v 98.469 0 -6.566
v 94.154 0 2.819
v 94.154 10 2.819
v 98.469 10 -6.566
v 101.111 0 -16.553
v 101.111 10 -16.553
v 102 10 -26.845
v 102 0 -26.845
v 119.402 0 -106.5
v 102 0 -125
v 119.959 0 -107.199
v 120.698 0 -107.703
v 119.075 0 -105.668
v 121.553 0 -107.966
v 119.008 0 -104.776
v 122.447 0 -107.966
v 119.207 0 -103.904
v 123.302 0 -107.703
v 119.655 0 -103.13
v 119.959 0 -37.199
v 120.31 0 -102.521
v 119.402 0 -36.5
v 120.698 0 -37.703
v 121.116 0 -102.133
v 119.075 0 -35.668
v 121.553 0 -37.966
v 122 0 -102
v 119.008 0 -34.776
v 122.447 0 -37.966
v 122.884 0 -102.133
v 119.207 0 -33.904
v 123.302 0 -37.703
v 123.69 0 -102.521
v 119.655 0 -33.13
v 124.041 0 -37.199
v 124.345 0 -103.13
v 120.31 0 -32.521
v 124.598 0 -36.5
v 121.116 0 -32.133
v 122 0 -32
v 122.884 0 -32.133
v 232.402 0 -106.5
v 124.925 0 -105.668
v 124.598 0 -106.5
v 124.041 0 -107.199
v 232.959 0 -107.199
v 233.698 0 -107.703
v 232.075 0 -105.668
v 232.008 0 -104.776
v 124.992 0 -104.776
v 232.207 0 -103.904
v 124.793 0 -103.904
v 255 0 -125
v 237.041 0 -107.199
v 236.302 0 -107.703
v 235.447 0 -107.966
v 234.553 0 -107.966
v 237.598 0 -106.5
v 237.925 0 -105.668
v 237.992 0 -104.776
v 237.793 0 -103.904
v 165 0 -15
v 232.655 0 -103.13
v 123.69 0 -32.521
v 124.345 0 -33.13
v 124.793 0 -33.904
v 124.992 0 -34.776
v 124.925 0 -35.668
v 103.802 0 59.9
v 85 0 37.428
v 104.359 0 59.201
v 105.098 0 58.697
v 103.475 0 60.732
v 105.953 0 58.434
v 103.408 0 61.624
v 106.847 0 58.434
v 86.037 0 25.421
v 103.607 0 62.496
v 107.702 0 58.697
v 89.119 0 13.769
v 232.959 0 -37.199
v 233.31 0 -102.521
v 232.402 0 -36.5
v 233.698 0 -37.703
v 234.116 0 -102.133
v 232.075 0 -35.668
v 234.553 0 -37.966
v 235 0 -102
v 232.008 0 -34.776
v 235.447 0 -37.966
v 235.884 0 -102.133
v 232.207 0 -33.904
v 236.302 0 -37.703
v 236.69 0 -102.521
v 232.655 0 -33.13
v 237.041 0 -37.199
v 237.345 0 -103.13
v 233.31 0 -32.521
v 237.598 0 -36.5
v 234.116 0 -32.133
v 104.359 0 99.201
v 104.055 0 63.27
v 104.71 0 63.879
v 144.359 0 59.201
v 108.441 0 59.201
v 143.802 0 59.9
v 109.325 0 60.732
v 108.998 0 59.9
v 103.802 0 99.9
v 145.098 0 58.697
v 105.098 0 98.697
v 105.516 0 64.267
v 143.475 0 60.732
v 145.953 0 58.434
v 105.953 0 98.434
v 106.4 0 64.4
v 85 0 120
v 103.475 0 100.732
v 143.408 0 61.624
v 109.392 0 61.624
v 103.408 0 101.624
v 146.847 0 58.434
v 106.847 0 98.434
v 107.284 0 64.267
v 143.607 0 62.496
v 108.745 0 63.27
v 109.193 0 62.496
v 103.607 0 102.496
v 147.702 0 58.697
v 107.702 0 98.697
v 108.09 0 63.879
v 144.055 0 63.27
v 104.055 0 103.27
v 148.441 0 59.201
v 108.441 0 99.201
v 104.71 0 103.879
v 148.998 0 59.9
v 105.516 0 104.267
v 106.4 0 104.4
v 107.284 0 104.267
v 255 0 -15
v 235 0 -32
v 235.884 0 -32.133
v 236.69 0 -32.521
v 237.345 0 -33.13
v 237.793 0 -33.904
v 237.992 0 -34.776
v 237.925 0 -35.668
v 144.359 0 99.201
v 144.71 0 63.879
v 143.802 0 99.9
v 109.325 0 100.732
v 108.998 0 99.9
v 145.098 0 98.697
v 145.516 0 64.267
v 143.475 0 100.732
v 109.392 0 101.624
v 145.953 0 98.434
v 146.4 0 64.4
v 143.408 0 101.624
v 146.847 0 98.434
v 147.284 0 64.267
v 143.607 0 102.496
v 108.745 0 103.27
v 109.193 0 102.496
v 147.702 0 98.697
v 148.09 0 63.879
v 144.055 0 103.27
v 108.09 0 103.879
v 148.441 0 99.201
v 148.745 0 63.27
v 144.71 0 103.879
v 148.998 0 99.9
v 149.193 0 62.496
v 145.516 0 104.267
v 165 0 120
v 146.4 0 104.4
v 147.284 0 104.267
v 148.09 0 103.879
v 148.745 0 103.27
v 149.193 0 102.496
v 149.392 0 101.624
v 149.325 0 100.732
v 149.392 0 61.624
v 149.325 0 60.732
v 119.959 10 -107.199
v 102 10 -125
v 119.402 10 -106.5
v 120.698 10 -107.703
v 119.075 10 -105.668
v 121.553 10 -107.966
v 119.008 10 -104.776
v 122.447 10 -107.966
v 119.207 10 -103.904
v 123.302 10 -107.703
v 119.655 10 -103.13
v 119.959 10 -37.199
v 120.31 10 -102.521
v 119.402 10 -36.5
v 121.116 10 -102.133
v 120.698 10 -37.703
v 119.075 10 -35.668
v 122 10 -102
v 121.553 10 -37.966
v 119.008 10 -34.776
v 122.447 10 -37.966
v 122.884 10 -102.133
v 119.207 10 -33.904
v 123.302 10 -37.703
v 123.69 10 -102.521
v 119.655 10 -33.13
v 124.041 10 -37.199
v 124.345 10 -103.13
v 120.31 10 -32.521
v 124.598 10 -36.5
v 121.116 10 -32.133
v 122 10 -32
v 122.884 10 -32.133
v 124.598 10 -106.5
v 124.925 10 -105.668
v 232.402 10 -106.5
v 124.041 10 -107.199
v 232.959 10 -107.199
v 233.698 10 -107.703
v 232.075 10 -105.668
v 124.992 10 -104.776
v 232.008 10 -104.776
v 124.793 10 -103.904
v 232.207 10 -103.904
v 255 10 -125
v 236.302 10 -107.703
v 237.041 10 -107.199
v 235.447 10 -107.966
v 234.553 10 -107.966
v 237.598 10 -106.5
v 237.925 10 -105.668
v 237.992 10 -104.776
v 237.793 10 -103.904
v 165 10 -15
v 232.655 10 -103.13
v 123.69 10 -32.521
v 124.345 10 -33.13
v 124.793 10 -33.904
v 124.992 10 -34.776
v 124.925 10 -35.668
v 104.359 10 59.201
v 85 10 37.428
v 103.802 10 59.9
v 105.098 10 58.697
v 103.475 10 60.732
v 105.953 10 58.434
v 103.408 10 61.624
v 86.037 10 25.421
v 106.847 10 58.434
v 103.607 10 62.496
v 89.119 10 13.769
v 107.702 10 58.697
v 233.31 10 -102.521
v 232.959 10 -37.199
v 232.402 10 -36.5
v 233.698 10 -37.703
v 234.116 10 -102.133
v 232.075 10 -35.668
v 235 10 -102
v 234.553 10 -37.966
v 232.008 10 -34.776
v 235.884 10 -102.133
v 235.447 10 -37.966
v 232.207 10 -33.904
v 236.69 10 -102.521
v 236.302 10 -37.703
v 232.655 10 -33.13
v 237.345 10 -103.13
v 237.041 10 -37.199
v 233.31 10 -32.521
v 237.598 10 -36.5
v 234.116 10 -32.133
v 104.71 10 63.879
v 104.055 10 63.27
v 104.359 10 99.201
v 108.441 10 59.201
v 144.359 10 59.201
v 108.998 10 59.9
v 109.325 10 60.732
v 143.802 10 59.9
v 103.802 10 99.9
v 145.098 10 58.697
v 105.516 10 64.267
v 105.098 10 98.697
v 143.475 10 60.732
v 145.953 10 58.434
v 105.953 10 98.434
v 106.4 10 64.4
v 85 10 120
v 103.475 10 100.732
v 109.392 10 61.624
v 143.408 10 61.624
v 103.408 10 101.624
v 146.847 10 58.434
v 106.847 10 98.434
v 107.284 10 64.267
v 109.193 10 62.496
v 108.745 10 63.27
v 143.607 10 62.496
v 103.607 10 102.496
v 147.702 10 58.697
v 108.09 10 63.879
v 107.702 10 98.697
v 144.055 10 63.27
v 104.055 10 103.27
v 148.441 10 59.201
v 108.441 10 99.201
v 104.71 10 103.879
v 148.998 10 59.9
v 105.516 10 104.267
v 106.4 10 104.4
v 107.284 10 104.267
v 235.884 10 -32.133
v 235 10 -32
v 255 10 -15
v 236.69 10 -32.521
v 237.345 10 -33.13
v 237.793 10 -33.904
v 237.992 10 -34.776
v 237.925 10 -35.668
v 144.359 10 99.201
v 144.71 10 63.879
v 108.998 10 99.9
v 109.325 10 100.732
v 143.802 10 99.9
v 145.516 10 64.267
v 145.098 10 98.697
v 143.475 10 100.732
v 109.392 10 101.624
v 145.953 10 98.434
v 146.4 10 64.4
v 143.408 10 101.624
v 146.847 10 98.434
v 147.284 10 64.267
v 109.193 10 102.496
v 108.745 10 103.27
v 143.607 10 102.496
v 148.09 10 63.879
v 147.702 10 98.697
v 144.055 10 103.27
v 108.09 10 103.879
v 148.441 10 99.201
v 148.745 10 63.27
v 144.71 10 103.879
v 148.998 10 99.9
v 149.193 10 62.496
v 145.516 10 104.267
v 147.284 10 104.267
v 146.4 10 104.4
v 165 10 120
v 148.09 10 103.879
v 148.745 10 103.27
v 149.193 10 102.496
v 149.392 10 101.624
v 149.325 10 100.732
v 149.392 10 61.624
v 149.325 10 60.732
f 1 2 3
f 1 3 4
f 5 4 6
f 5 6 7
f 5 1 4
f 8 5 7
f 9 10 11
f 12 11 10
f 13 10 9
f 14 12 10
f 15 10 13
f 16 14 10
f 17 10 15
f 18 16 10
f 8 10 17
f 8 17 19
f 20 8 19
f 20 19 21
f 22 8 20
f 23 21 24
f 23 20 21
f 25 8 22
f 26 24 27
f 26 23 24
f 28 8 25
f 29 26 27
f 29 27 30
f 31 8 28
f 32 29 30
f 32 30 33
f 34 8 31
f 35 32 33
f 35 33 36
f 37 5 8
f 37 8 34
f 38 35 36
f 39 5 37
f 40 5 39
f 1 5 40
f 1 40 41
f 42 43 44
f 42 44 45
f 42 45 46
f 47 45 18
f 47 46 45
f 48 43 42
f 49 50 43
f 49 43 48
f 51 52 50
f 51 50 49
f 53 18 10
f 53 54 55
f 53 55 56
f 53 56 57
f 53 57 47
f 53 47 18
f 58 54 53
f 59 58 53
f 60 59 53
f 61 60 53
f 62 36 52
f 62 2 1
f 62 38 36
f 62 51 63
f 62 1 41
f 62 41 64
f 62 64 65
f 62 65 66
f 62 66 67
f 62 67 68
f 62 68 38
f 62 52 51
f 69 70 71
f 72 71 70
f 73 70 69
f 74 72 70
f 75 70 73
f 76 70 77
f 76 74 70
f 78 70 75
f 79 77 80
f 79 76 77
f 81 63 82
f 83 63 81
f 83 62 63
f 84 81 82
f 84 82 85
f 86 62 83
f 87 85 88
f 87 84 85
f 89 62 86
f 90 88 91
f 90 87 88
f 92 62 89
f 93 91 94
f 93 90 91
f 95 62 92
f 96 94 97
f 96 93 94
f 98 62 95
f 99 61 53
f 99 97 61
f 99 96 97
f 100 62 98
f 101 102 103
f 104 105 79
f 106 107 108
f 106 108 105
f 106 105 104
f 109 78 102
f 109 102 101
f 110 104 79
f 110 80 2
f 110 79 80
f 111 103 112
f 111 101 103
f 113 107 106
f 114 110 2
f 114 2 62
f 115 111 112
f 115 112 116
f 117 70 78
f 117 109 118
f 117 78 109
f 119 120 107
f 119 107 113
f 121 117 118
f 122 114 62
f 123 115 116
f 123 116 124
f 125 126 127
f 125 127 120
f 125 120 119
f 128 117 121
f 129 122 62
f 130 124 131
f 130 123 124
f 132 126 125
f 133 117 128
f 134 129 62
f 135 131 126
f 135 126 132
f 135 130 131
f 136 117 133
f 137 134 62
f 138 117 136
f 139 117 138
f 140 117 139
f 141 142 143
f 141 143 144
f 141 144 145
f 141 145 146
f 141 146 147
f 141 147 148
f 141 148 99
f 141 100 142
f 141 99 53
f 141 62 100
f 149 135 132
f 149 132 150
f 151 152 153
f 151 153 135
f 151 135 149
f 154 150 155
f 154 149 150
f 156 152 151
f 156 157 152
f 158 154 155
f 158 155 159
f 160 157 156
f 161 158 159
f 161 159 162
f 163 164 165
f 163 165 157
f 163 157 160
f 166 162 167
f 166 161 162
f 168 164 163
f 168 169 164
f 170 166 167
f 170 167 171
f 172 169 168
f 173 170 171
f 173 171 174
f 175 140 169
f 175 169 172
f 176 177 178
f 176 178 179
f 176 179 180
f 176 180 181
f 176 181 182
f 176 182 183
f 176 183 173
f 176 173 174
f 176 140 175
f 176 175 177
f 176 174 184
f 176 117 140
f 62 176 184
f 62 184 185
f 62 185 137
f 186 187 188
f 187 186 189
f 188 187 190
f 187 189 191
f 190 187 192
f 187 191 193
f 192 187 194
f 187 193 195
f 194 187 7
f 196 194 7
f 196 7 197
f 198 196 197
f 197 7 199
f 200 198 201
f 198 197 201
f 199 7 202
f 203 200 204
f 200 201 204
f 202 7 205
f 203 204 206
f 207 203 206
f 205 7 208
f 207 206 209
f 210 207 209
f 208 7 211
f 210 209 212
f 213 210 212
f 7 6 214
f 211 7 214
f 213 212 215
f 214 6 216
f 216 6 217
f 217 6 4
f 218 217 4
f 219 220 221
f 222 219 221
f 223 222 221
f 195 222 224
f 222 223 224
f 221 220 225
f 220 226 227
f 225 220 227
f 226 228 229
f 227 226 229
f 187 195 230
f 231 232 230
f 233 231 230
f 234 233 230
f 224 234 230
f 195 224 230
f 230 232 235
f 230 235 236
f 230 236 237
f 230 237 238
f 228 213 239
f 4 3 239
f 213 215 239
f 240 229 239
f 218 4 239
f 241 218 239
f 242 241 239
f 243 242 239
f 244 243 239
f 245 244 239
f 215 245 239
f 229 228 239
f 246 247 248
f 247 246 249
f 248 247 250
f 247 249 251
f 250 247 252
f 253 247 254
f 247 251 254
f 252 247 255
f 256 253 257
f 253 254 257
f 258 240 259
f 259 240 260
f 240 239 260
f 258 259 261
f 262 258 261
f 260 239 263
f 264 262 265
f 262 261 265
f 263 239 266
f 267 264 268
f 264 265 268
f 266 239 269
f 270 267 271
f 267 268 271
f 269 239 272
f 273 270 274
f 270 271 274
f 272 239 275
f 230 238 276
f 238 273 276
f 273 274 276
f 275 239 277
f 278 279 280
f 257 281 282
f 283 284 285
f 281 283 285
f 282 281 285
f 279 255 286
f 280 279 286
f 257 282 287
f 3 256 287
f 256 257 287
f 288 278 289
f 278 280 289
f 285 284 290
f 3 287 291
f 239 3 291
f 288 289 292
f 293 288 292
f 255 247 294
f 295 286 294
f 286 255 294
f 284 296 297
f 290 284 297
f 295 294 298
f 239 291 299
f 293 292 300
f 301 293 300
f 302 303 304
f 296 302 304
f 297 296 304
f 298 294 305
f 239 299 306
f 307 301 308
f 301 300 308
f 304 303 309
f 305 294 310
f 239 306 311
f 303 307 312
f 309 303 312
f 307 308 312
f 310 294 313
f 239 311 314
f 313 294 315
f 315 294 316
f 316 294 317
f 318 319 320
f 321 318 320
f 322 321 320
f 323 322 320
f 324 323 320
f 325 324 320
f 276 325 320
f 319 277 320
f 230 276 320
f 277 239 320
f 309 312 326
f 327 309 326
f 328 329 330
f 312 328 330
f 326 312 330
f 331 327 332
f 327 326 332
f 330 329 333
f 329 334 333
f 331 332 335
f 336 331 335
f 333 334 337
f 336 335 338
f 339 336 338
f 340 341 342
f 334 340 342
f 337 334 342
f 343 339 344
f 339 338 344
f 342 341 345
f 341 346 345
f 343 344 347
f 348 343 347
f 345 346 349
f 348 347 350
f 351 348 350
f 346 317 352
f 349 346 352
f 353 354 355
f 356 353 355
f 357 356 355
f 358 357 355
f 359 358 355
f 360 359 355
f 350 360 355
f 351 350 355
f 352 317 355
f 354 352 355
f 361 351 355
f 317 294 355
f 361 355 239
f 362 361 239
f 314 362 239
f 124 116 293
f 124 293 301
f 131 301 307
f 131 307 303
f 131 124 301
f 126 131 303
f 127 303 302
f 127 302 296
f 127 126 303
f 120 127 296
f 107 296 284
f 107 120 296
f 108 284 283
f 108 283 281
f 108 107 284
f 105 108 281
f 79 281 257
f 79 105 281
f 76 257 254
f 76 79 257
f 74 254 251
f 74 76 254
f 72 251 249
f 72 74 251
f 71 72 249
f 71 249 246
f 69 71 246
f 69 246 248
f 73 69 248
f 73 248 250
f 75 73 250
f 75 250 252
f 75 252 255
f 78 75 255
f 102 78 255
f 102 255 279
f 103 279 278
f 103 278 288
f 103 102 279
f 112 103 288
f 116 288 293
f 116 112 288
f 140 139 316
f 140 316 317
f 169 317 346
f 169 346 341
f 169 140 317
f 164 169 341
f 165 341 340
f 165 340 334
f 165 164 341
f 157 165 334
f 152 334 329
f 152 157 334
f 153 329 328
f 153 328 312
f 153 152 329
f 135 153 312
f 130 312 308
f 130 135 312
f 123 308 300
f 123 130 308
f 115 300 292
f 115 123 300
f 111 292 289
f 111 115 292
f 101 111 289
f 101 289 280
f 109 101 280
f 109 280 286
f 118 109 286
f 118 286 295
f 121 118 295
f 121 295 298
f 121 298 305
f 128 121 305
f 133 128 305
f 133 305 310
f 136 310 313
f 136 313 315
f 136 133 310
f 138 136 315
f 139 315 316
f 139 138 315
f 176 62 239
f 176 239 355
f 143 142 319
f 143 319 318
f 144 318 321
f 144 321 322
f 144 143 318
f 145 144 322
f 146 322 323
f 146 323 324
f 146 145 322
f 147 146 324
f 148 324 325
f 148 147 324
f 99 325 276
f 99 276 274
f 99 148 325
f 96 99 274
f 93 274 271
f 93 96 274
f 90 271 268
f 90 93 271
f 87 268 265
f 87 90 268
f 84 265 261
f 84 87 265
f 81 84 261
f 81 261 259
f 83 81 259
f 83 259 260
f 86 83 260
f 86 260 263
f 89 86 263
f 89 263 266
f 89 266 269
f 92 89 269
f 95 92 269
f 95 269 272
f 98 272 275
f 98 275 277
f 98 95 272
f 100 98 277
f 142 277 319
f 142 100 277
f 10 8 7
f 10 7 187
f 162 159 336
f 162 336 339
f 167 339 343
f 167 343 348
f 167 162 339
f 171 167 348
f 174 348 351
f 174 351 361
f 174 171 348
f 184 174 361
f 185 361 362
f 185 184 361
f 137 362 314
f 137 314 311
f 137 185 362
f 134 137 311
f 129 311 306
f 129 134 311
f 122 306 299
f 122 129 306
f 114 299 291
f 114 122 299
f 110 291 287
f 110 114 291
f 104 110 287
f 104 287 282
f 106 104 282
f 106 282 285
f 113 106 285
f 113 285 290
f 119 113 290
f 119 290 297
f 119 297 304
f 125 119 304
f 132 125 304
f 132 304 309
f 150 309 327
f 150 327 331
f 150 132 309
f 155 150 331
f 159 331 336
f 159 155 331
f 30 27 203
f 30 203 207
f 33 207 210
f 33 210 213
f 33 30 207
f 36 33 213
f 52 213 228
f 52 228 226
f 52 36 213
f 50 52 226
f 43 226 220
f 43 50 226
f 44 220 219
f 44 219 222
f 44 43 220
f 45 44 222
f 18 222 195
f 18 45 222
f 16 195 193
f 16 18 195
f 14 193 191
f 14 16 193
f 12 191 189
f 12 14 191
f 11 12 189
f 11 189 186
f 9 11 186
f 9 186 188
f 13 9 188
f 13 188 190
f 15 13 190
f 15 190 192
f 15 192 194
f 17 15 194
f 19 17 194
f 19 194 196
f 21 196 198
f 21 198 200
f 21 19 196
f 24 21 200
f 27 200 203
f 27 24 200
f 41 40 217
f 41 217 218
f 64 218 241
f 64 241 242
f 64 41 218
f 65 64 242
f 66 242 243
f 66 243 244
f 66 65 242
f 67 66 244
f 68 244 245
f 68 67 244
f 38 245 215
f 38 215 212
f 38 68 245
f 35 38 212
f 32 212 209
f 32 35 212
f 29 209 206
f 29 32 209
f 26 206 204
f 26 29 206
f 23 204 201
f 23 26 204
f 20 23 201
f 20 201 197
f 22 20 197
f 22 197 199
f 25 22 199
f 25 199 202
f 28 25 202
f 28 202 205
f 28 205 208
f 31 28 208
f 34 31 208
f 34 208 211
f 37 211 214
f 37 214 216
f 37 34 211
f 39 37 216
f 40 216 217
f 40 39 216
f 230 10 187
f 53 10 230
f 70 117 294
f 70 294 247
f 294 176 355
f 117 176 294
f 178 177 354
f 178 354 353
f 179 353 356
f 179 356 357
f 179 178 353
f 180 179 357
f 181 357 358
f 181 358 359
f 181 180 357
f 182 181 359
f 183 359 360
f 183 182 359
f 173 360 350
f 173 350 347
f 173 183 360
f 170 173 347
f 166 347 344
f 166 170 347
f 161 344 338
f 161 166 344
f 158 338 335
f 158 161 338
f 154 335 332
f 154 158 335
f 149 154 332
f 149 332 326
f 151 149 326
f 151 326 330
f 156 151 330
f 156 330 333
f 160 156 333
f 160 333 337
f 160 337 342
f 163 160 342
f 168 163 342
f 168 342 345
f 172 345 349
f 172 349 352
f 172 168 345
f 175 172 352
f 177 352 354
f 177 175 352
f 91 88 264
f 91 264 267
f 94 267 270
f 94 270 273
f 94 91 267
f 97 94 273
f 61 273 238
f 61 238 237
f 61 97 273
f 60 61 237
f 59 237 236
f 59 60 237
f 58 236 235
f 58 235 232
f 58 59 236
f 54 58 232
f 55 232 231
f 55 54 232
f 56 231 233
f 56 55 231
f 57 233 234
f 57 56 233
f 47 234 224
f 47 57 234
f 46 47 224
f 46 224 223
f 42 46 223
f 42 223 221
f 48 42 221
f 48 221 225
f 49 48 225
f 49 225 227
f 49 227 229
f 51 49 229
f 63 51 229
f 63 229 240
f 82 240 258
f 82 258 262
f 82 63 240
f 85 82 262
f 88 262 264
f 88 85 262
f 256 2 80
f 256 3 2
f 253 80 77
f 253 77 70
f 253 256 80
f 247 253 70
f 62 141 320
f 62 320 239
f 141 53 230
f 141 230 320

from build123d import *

# Parameters (mm, degrees)
SKETCH1_R           = 3
BOSS_EXTRUDE1_DEPTH = 10
FILLET2_R           = 60
FILLET3_R           = 70


with BuildPart() as part:
    # Sketch1 → Boss-Extrude1 (new body)
    with BuildSketch(Plane(origin=(0, 0, 0), x_dir=(1, 0, 0), z_dir=(0, 1, 0))):
        Polygon((165, -120), (85, -120), (85, -15), (102, -15), (102, 125), (255, 125), (255, 15), (165, 15), align=None)
        with Locations(Location((146.4, -101.4, 0), (0, 0, 270))):
            Circle(SKETCH1_R, mode=Mode.SUBTRACT)
        with Locations(Location((106.4, -101.4, 0), (0, 0, 270))):
            Circle(SKETCH1_R, mode=Mode.SUBTRACT)
        with Locations(Location((146.4, -61.4, 0), (0, 0, 270))):
            Circle(SKETCH1_R, mode=Mode.SUBTRACT)
        with Locations(Location((106.4, -61.4, 0), (0, 0, 270))):
            Circle(SKETCH1_R, mode=Mode.SUBTRACT)
        with Locations(Location((122, 35, 0), (0, 0, 270))):
            Circle(SKETCH1_R, mode=Mode.SUBTRACT)
        with Locations(Location((235, 35, 0), (0, 0, 270))):
            Circle(SKETCH1_R, mode=Mode.SUBTRACT)
        with Locations(Location((235, 105, 0), (0, 0, 270))):
            Circle(SKETCH1_R, mode=Mode.SUBTRACT)
        with Locations(Location((122, 105, 0), (0, 0, 270))):
            Circle(SKETCH1_R, mode=Mode.SUBTRACT)
    extrude(amount=BOSS_EXTRUDE1_DEPTH)

    # Fillet2
    # the kernel refuses this fillet: 60 mm, written as the material it adds along each edge
    with BuildSketch(Plane(origin=(102, 0, 15), x_dir=(-1, 0, 0), z_dir=(0, 1, 0))) as fillet2_piece_1:
        with BuildLine():
            CenterArc((60, -41.844951906), FILLET2_R, 135.779955572, 44.220044428)
            Line((0, -41.844951906), (-1.2, -41.844951906))
            Line((-1.2, -41.844951906), (-1.2, 0))
            Line((-1.2, 0), (0, 1.2))
            ThreePointArc((0, 1.2), (8.5, 1.2), (16.14, 0.836899038))
            Line((16.14, 0.836899038), (17, 0))
        make_face()
    extrude(amount=10)

    # Fillet3
    fillet3_edges = [part.edges().sort_by_distance(p)[0] for p in [
        (85, 5, 15),
    ]]
    fillet(fillet3_edges, radius=FILLET3_R)


solid = part.part
